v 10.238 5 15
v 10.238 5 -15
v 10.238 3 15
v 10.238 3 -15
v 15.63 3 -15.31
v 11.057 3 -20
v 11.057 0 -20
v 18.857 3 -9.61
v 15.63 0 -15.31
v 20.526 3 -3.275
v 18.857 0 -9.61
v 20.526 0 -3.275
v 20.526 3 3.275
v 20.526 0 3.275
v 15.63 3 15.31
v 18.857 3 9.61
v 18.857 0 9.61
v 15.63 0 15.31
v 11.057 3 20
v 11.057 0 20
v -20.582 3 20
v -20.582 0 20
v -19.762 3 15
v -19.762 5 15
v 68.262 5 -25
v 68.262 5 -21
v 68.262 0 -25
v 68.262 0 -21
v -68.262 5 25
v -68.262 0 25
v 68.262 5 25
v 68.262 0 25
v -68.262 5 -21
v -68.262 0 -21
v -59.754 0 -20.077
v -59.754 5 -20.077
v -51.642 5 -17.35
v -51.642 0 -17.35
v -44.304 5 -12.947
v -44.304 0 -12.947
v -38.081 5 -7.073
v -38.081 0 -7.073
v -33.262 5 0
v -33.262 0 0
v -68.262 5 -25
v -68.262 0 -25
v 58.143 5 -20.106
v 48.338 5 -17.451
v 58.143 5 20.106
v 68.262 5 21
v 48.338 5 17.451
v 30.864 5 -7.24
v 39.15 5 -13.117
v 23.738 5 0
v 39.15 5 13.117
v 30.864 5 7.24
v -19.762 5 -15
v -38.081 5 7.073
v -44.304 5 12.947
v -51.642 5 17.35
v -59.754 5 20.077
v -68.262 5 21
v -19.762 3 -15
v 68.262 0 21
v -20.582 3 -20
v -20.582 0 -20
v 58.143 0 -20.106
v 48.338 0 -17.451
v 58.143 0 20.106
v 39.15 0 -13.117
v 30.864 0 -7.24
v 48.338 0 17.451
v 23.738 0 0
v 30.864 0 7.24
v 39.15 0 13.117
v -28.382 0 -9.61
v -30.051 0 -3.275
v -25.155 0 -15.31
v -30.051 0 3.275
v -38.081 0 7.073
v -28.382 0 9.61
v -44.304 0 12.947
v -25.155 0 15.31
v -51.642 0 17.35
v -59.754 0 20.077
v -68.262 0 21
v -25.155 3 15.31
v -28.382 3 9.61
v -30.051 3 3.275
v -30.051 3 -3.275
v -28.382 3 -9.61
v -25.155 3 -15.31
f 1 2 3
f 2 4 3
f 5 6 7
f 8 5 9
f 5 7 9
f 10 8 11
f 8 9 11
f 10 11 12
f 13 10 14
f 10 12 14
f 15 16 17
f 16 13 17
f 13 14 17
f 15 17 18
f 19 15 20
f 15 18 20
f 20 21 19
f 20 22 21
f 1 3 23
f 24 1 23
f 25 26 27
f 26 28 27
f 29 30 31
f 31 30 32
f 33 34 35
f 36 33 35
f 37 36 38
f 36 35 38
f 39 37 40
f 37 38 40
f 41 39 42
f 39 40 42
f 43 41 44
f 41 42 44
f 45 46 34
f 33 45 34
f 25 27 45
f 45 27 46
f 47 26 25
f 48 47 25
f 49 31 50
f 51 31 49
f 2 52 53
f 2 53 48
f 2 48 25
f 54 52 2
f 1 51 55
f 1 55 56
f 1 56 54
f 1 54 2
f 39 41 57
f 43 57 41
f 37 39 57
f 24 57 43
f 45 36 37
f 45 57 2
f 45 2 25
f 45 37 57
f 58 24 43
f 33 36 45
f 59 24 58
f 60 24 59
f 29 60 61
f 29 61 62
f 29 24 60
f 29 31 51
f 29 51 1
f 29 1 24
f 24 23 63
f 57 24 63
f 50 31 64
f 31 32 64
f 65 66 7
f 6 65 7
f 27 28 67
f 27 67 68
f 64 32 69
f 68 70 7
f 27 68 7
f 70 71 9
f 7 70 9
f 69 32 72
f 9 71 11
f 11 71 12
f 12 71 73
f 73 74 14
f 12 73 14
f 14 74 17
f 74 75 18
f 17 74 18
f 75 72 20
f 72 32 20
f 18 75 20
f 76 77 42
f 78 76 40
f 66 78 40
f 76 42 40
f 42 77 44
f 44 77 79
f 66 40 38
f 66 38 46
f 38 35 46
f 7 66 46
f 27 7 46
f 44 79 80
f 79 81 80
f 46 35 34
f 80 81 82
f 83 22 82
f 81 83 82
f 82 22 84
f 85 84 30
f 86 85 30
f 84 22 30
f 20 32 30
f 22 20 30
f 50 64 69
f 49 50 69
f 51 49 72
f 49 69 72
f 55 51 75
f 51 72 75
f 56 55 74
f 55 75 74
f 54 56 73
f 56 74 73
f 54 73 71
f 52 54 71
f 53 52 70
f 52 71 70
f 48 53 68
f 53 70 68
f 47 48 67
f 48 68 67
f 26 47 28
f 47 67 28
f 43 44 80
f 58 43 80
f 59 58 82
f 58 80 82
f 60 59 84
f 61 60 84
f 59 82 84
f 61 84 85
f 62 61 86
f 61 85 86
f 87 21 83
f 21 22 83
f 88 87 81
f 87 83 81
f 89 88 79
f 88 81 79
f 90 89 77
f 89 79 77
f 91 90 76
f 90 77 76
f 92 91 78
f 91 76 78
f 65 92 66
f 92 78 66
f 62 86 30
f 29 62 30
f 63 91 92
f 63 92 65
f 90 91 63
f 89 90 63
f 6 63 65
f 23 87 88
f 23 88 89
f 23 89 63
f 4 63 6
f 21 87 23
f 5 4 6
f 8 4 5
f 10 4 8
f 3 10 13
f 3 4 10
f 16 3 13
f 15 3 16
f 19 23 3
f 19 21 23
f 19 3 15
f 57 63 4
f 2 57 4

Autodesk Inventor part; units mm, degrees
ref_plane "YZ Plane" through (0, 0, 0) normal (1, 0, 0) x (0, 1, 0)
ref_plane "XZ Plane" through (0, 0, 0) normal (0, 1, 0) x (-1, 0, 0)
ref_plane "XY Plane" through (0, 0, 0) normal (0, 0, 1) x (1, 0, 0)
sketch "Sketch1" plane through (0, 0, 0) normal (0, 1, 0) x (-1, 0, 0)
  line L0 (-68.2625, -25) -> (68.2625, -25)
  line L1 (68.2625, -25) -> (68.2625, 25)
  line L2 (68.2625, 25) -> (-68.2625, 25)
  line L3 (-68.2625, 25) -> (-68.2625, -25)
  line L4 (-68.2625, -25) -> (68.2625, 25) construction
  line L5 (68.2625, -25) -> (-68.2625, 25) construction
  point P0 (0, 0)
  dimension "d0" = 136.525
  dimension "d1" = 50
extrude "Extrusion1" add sketch "Sketch1" along normal blind 5
sketch "Sketch2" plane through (0, 0, 0) normal (0, -1, 0) x (1, 0, 0)
  circle A0 centre (-4.7625, 0) radius 25.5
  line L0 (-68.2625, -25) -> (-68.2625, 25) projected
  line L1 (-20.5818, -20) -> (11.0568, -20)
  line L2 (-20.5818, 20) -> (11.0568, 20)
  point P0 (0, 0)
  dimension "d4" = 51
  dimension "d5" = 63.5
  dimension "d6" = 40
  dimension "d7" = 20
extrude "Extrusion2" cut sketch "Sketch2" against normal blind 3 contours A0 L1 L2
sketch "Sketch3" plane through (0, 0, 0) normal (0, -1, 0) x (1, 0, 0)
  line L0 (68.2625, 25) -> (68.2625, -25) projected
  arc A0 (23.7375, 0) -> (68.2625, -21) centre (68.2625, 36.7018) ccw
  arc A1 (68.2625, 21) -> (23.7375, 0) centre (68.2625, -36.7018) ccw
  arc A2 (11.0568, -20) -> (11.0568, 20) centre (-4.7625, 0) ccw projected
  line L1 (-68.2625, -25) -> (-68.2625, 25) projected
  arc A3 (-68.2625, -21) -> (-33.2625, 0) centre (-68.2625, 18.6667) ccw
  arc A4 (-33.2625, 0) -> (-68.2625, 21) centre (-68.2625, -18.6667) ccw
  arc A5 (-20.5818, 20) -> (-20.5818, -20) centre (-4.7625, 0) ccw projected
  line L2 (10.2375, 15) -> (-19.7625, 15)
  line L3 (-19.7625, 15) -> (-19.7625, -15)
  line L4 (-19.7625, -15) -> (10.2375, -15)
  line L5 (10.2375, -15) -> (10.2375, 15)
  line L6 (10.2375, 15) -> (-19.7625, -15) construction
  line L7 (-19.7625, 15) -> (10.2375, -15) construction
  point P0 (0, 0)
  point P1 (20.7375, 0)
  point P2 (-30.2625, 0)
  dimension "d10" = 4
  dimension "d11" = 4
  dimension "d12" = 3
  dimension "d13" = 4
  dimension "d14" = 4
  dimension "d15" = 3
  dimension "d16" = 30
  dimension "d17" = 30
extrude "Extrusion3" cut sketch "Sketch3" against normal through all
equation "\"d7\" = 0.5 * d6"
equation "\"d11\" = d10"
equation "\"d14\" = d13"
properties part number "Spin Arrest"
